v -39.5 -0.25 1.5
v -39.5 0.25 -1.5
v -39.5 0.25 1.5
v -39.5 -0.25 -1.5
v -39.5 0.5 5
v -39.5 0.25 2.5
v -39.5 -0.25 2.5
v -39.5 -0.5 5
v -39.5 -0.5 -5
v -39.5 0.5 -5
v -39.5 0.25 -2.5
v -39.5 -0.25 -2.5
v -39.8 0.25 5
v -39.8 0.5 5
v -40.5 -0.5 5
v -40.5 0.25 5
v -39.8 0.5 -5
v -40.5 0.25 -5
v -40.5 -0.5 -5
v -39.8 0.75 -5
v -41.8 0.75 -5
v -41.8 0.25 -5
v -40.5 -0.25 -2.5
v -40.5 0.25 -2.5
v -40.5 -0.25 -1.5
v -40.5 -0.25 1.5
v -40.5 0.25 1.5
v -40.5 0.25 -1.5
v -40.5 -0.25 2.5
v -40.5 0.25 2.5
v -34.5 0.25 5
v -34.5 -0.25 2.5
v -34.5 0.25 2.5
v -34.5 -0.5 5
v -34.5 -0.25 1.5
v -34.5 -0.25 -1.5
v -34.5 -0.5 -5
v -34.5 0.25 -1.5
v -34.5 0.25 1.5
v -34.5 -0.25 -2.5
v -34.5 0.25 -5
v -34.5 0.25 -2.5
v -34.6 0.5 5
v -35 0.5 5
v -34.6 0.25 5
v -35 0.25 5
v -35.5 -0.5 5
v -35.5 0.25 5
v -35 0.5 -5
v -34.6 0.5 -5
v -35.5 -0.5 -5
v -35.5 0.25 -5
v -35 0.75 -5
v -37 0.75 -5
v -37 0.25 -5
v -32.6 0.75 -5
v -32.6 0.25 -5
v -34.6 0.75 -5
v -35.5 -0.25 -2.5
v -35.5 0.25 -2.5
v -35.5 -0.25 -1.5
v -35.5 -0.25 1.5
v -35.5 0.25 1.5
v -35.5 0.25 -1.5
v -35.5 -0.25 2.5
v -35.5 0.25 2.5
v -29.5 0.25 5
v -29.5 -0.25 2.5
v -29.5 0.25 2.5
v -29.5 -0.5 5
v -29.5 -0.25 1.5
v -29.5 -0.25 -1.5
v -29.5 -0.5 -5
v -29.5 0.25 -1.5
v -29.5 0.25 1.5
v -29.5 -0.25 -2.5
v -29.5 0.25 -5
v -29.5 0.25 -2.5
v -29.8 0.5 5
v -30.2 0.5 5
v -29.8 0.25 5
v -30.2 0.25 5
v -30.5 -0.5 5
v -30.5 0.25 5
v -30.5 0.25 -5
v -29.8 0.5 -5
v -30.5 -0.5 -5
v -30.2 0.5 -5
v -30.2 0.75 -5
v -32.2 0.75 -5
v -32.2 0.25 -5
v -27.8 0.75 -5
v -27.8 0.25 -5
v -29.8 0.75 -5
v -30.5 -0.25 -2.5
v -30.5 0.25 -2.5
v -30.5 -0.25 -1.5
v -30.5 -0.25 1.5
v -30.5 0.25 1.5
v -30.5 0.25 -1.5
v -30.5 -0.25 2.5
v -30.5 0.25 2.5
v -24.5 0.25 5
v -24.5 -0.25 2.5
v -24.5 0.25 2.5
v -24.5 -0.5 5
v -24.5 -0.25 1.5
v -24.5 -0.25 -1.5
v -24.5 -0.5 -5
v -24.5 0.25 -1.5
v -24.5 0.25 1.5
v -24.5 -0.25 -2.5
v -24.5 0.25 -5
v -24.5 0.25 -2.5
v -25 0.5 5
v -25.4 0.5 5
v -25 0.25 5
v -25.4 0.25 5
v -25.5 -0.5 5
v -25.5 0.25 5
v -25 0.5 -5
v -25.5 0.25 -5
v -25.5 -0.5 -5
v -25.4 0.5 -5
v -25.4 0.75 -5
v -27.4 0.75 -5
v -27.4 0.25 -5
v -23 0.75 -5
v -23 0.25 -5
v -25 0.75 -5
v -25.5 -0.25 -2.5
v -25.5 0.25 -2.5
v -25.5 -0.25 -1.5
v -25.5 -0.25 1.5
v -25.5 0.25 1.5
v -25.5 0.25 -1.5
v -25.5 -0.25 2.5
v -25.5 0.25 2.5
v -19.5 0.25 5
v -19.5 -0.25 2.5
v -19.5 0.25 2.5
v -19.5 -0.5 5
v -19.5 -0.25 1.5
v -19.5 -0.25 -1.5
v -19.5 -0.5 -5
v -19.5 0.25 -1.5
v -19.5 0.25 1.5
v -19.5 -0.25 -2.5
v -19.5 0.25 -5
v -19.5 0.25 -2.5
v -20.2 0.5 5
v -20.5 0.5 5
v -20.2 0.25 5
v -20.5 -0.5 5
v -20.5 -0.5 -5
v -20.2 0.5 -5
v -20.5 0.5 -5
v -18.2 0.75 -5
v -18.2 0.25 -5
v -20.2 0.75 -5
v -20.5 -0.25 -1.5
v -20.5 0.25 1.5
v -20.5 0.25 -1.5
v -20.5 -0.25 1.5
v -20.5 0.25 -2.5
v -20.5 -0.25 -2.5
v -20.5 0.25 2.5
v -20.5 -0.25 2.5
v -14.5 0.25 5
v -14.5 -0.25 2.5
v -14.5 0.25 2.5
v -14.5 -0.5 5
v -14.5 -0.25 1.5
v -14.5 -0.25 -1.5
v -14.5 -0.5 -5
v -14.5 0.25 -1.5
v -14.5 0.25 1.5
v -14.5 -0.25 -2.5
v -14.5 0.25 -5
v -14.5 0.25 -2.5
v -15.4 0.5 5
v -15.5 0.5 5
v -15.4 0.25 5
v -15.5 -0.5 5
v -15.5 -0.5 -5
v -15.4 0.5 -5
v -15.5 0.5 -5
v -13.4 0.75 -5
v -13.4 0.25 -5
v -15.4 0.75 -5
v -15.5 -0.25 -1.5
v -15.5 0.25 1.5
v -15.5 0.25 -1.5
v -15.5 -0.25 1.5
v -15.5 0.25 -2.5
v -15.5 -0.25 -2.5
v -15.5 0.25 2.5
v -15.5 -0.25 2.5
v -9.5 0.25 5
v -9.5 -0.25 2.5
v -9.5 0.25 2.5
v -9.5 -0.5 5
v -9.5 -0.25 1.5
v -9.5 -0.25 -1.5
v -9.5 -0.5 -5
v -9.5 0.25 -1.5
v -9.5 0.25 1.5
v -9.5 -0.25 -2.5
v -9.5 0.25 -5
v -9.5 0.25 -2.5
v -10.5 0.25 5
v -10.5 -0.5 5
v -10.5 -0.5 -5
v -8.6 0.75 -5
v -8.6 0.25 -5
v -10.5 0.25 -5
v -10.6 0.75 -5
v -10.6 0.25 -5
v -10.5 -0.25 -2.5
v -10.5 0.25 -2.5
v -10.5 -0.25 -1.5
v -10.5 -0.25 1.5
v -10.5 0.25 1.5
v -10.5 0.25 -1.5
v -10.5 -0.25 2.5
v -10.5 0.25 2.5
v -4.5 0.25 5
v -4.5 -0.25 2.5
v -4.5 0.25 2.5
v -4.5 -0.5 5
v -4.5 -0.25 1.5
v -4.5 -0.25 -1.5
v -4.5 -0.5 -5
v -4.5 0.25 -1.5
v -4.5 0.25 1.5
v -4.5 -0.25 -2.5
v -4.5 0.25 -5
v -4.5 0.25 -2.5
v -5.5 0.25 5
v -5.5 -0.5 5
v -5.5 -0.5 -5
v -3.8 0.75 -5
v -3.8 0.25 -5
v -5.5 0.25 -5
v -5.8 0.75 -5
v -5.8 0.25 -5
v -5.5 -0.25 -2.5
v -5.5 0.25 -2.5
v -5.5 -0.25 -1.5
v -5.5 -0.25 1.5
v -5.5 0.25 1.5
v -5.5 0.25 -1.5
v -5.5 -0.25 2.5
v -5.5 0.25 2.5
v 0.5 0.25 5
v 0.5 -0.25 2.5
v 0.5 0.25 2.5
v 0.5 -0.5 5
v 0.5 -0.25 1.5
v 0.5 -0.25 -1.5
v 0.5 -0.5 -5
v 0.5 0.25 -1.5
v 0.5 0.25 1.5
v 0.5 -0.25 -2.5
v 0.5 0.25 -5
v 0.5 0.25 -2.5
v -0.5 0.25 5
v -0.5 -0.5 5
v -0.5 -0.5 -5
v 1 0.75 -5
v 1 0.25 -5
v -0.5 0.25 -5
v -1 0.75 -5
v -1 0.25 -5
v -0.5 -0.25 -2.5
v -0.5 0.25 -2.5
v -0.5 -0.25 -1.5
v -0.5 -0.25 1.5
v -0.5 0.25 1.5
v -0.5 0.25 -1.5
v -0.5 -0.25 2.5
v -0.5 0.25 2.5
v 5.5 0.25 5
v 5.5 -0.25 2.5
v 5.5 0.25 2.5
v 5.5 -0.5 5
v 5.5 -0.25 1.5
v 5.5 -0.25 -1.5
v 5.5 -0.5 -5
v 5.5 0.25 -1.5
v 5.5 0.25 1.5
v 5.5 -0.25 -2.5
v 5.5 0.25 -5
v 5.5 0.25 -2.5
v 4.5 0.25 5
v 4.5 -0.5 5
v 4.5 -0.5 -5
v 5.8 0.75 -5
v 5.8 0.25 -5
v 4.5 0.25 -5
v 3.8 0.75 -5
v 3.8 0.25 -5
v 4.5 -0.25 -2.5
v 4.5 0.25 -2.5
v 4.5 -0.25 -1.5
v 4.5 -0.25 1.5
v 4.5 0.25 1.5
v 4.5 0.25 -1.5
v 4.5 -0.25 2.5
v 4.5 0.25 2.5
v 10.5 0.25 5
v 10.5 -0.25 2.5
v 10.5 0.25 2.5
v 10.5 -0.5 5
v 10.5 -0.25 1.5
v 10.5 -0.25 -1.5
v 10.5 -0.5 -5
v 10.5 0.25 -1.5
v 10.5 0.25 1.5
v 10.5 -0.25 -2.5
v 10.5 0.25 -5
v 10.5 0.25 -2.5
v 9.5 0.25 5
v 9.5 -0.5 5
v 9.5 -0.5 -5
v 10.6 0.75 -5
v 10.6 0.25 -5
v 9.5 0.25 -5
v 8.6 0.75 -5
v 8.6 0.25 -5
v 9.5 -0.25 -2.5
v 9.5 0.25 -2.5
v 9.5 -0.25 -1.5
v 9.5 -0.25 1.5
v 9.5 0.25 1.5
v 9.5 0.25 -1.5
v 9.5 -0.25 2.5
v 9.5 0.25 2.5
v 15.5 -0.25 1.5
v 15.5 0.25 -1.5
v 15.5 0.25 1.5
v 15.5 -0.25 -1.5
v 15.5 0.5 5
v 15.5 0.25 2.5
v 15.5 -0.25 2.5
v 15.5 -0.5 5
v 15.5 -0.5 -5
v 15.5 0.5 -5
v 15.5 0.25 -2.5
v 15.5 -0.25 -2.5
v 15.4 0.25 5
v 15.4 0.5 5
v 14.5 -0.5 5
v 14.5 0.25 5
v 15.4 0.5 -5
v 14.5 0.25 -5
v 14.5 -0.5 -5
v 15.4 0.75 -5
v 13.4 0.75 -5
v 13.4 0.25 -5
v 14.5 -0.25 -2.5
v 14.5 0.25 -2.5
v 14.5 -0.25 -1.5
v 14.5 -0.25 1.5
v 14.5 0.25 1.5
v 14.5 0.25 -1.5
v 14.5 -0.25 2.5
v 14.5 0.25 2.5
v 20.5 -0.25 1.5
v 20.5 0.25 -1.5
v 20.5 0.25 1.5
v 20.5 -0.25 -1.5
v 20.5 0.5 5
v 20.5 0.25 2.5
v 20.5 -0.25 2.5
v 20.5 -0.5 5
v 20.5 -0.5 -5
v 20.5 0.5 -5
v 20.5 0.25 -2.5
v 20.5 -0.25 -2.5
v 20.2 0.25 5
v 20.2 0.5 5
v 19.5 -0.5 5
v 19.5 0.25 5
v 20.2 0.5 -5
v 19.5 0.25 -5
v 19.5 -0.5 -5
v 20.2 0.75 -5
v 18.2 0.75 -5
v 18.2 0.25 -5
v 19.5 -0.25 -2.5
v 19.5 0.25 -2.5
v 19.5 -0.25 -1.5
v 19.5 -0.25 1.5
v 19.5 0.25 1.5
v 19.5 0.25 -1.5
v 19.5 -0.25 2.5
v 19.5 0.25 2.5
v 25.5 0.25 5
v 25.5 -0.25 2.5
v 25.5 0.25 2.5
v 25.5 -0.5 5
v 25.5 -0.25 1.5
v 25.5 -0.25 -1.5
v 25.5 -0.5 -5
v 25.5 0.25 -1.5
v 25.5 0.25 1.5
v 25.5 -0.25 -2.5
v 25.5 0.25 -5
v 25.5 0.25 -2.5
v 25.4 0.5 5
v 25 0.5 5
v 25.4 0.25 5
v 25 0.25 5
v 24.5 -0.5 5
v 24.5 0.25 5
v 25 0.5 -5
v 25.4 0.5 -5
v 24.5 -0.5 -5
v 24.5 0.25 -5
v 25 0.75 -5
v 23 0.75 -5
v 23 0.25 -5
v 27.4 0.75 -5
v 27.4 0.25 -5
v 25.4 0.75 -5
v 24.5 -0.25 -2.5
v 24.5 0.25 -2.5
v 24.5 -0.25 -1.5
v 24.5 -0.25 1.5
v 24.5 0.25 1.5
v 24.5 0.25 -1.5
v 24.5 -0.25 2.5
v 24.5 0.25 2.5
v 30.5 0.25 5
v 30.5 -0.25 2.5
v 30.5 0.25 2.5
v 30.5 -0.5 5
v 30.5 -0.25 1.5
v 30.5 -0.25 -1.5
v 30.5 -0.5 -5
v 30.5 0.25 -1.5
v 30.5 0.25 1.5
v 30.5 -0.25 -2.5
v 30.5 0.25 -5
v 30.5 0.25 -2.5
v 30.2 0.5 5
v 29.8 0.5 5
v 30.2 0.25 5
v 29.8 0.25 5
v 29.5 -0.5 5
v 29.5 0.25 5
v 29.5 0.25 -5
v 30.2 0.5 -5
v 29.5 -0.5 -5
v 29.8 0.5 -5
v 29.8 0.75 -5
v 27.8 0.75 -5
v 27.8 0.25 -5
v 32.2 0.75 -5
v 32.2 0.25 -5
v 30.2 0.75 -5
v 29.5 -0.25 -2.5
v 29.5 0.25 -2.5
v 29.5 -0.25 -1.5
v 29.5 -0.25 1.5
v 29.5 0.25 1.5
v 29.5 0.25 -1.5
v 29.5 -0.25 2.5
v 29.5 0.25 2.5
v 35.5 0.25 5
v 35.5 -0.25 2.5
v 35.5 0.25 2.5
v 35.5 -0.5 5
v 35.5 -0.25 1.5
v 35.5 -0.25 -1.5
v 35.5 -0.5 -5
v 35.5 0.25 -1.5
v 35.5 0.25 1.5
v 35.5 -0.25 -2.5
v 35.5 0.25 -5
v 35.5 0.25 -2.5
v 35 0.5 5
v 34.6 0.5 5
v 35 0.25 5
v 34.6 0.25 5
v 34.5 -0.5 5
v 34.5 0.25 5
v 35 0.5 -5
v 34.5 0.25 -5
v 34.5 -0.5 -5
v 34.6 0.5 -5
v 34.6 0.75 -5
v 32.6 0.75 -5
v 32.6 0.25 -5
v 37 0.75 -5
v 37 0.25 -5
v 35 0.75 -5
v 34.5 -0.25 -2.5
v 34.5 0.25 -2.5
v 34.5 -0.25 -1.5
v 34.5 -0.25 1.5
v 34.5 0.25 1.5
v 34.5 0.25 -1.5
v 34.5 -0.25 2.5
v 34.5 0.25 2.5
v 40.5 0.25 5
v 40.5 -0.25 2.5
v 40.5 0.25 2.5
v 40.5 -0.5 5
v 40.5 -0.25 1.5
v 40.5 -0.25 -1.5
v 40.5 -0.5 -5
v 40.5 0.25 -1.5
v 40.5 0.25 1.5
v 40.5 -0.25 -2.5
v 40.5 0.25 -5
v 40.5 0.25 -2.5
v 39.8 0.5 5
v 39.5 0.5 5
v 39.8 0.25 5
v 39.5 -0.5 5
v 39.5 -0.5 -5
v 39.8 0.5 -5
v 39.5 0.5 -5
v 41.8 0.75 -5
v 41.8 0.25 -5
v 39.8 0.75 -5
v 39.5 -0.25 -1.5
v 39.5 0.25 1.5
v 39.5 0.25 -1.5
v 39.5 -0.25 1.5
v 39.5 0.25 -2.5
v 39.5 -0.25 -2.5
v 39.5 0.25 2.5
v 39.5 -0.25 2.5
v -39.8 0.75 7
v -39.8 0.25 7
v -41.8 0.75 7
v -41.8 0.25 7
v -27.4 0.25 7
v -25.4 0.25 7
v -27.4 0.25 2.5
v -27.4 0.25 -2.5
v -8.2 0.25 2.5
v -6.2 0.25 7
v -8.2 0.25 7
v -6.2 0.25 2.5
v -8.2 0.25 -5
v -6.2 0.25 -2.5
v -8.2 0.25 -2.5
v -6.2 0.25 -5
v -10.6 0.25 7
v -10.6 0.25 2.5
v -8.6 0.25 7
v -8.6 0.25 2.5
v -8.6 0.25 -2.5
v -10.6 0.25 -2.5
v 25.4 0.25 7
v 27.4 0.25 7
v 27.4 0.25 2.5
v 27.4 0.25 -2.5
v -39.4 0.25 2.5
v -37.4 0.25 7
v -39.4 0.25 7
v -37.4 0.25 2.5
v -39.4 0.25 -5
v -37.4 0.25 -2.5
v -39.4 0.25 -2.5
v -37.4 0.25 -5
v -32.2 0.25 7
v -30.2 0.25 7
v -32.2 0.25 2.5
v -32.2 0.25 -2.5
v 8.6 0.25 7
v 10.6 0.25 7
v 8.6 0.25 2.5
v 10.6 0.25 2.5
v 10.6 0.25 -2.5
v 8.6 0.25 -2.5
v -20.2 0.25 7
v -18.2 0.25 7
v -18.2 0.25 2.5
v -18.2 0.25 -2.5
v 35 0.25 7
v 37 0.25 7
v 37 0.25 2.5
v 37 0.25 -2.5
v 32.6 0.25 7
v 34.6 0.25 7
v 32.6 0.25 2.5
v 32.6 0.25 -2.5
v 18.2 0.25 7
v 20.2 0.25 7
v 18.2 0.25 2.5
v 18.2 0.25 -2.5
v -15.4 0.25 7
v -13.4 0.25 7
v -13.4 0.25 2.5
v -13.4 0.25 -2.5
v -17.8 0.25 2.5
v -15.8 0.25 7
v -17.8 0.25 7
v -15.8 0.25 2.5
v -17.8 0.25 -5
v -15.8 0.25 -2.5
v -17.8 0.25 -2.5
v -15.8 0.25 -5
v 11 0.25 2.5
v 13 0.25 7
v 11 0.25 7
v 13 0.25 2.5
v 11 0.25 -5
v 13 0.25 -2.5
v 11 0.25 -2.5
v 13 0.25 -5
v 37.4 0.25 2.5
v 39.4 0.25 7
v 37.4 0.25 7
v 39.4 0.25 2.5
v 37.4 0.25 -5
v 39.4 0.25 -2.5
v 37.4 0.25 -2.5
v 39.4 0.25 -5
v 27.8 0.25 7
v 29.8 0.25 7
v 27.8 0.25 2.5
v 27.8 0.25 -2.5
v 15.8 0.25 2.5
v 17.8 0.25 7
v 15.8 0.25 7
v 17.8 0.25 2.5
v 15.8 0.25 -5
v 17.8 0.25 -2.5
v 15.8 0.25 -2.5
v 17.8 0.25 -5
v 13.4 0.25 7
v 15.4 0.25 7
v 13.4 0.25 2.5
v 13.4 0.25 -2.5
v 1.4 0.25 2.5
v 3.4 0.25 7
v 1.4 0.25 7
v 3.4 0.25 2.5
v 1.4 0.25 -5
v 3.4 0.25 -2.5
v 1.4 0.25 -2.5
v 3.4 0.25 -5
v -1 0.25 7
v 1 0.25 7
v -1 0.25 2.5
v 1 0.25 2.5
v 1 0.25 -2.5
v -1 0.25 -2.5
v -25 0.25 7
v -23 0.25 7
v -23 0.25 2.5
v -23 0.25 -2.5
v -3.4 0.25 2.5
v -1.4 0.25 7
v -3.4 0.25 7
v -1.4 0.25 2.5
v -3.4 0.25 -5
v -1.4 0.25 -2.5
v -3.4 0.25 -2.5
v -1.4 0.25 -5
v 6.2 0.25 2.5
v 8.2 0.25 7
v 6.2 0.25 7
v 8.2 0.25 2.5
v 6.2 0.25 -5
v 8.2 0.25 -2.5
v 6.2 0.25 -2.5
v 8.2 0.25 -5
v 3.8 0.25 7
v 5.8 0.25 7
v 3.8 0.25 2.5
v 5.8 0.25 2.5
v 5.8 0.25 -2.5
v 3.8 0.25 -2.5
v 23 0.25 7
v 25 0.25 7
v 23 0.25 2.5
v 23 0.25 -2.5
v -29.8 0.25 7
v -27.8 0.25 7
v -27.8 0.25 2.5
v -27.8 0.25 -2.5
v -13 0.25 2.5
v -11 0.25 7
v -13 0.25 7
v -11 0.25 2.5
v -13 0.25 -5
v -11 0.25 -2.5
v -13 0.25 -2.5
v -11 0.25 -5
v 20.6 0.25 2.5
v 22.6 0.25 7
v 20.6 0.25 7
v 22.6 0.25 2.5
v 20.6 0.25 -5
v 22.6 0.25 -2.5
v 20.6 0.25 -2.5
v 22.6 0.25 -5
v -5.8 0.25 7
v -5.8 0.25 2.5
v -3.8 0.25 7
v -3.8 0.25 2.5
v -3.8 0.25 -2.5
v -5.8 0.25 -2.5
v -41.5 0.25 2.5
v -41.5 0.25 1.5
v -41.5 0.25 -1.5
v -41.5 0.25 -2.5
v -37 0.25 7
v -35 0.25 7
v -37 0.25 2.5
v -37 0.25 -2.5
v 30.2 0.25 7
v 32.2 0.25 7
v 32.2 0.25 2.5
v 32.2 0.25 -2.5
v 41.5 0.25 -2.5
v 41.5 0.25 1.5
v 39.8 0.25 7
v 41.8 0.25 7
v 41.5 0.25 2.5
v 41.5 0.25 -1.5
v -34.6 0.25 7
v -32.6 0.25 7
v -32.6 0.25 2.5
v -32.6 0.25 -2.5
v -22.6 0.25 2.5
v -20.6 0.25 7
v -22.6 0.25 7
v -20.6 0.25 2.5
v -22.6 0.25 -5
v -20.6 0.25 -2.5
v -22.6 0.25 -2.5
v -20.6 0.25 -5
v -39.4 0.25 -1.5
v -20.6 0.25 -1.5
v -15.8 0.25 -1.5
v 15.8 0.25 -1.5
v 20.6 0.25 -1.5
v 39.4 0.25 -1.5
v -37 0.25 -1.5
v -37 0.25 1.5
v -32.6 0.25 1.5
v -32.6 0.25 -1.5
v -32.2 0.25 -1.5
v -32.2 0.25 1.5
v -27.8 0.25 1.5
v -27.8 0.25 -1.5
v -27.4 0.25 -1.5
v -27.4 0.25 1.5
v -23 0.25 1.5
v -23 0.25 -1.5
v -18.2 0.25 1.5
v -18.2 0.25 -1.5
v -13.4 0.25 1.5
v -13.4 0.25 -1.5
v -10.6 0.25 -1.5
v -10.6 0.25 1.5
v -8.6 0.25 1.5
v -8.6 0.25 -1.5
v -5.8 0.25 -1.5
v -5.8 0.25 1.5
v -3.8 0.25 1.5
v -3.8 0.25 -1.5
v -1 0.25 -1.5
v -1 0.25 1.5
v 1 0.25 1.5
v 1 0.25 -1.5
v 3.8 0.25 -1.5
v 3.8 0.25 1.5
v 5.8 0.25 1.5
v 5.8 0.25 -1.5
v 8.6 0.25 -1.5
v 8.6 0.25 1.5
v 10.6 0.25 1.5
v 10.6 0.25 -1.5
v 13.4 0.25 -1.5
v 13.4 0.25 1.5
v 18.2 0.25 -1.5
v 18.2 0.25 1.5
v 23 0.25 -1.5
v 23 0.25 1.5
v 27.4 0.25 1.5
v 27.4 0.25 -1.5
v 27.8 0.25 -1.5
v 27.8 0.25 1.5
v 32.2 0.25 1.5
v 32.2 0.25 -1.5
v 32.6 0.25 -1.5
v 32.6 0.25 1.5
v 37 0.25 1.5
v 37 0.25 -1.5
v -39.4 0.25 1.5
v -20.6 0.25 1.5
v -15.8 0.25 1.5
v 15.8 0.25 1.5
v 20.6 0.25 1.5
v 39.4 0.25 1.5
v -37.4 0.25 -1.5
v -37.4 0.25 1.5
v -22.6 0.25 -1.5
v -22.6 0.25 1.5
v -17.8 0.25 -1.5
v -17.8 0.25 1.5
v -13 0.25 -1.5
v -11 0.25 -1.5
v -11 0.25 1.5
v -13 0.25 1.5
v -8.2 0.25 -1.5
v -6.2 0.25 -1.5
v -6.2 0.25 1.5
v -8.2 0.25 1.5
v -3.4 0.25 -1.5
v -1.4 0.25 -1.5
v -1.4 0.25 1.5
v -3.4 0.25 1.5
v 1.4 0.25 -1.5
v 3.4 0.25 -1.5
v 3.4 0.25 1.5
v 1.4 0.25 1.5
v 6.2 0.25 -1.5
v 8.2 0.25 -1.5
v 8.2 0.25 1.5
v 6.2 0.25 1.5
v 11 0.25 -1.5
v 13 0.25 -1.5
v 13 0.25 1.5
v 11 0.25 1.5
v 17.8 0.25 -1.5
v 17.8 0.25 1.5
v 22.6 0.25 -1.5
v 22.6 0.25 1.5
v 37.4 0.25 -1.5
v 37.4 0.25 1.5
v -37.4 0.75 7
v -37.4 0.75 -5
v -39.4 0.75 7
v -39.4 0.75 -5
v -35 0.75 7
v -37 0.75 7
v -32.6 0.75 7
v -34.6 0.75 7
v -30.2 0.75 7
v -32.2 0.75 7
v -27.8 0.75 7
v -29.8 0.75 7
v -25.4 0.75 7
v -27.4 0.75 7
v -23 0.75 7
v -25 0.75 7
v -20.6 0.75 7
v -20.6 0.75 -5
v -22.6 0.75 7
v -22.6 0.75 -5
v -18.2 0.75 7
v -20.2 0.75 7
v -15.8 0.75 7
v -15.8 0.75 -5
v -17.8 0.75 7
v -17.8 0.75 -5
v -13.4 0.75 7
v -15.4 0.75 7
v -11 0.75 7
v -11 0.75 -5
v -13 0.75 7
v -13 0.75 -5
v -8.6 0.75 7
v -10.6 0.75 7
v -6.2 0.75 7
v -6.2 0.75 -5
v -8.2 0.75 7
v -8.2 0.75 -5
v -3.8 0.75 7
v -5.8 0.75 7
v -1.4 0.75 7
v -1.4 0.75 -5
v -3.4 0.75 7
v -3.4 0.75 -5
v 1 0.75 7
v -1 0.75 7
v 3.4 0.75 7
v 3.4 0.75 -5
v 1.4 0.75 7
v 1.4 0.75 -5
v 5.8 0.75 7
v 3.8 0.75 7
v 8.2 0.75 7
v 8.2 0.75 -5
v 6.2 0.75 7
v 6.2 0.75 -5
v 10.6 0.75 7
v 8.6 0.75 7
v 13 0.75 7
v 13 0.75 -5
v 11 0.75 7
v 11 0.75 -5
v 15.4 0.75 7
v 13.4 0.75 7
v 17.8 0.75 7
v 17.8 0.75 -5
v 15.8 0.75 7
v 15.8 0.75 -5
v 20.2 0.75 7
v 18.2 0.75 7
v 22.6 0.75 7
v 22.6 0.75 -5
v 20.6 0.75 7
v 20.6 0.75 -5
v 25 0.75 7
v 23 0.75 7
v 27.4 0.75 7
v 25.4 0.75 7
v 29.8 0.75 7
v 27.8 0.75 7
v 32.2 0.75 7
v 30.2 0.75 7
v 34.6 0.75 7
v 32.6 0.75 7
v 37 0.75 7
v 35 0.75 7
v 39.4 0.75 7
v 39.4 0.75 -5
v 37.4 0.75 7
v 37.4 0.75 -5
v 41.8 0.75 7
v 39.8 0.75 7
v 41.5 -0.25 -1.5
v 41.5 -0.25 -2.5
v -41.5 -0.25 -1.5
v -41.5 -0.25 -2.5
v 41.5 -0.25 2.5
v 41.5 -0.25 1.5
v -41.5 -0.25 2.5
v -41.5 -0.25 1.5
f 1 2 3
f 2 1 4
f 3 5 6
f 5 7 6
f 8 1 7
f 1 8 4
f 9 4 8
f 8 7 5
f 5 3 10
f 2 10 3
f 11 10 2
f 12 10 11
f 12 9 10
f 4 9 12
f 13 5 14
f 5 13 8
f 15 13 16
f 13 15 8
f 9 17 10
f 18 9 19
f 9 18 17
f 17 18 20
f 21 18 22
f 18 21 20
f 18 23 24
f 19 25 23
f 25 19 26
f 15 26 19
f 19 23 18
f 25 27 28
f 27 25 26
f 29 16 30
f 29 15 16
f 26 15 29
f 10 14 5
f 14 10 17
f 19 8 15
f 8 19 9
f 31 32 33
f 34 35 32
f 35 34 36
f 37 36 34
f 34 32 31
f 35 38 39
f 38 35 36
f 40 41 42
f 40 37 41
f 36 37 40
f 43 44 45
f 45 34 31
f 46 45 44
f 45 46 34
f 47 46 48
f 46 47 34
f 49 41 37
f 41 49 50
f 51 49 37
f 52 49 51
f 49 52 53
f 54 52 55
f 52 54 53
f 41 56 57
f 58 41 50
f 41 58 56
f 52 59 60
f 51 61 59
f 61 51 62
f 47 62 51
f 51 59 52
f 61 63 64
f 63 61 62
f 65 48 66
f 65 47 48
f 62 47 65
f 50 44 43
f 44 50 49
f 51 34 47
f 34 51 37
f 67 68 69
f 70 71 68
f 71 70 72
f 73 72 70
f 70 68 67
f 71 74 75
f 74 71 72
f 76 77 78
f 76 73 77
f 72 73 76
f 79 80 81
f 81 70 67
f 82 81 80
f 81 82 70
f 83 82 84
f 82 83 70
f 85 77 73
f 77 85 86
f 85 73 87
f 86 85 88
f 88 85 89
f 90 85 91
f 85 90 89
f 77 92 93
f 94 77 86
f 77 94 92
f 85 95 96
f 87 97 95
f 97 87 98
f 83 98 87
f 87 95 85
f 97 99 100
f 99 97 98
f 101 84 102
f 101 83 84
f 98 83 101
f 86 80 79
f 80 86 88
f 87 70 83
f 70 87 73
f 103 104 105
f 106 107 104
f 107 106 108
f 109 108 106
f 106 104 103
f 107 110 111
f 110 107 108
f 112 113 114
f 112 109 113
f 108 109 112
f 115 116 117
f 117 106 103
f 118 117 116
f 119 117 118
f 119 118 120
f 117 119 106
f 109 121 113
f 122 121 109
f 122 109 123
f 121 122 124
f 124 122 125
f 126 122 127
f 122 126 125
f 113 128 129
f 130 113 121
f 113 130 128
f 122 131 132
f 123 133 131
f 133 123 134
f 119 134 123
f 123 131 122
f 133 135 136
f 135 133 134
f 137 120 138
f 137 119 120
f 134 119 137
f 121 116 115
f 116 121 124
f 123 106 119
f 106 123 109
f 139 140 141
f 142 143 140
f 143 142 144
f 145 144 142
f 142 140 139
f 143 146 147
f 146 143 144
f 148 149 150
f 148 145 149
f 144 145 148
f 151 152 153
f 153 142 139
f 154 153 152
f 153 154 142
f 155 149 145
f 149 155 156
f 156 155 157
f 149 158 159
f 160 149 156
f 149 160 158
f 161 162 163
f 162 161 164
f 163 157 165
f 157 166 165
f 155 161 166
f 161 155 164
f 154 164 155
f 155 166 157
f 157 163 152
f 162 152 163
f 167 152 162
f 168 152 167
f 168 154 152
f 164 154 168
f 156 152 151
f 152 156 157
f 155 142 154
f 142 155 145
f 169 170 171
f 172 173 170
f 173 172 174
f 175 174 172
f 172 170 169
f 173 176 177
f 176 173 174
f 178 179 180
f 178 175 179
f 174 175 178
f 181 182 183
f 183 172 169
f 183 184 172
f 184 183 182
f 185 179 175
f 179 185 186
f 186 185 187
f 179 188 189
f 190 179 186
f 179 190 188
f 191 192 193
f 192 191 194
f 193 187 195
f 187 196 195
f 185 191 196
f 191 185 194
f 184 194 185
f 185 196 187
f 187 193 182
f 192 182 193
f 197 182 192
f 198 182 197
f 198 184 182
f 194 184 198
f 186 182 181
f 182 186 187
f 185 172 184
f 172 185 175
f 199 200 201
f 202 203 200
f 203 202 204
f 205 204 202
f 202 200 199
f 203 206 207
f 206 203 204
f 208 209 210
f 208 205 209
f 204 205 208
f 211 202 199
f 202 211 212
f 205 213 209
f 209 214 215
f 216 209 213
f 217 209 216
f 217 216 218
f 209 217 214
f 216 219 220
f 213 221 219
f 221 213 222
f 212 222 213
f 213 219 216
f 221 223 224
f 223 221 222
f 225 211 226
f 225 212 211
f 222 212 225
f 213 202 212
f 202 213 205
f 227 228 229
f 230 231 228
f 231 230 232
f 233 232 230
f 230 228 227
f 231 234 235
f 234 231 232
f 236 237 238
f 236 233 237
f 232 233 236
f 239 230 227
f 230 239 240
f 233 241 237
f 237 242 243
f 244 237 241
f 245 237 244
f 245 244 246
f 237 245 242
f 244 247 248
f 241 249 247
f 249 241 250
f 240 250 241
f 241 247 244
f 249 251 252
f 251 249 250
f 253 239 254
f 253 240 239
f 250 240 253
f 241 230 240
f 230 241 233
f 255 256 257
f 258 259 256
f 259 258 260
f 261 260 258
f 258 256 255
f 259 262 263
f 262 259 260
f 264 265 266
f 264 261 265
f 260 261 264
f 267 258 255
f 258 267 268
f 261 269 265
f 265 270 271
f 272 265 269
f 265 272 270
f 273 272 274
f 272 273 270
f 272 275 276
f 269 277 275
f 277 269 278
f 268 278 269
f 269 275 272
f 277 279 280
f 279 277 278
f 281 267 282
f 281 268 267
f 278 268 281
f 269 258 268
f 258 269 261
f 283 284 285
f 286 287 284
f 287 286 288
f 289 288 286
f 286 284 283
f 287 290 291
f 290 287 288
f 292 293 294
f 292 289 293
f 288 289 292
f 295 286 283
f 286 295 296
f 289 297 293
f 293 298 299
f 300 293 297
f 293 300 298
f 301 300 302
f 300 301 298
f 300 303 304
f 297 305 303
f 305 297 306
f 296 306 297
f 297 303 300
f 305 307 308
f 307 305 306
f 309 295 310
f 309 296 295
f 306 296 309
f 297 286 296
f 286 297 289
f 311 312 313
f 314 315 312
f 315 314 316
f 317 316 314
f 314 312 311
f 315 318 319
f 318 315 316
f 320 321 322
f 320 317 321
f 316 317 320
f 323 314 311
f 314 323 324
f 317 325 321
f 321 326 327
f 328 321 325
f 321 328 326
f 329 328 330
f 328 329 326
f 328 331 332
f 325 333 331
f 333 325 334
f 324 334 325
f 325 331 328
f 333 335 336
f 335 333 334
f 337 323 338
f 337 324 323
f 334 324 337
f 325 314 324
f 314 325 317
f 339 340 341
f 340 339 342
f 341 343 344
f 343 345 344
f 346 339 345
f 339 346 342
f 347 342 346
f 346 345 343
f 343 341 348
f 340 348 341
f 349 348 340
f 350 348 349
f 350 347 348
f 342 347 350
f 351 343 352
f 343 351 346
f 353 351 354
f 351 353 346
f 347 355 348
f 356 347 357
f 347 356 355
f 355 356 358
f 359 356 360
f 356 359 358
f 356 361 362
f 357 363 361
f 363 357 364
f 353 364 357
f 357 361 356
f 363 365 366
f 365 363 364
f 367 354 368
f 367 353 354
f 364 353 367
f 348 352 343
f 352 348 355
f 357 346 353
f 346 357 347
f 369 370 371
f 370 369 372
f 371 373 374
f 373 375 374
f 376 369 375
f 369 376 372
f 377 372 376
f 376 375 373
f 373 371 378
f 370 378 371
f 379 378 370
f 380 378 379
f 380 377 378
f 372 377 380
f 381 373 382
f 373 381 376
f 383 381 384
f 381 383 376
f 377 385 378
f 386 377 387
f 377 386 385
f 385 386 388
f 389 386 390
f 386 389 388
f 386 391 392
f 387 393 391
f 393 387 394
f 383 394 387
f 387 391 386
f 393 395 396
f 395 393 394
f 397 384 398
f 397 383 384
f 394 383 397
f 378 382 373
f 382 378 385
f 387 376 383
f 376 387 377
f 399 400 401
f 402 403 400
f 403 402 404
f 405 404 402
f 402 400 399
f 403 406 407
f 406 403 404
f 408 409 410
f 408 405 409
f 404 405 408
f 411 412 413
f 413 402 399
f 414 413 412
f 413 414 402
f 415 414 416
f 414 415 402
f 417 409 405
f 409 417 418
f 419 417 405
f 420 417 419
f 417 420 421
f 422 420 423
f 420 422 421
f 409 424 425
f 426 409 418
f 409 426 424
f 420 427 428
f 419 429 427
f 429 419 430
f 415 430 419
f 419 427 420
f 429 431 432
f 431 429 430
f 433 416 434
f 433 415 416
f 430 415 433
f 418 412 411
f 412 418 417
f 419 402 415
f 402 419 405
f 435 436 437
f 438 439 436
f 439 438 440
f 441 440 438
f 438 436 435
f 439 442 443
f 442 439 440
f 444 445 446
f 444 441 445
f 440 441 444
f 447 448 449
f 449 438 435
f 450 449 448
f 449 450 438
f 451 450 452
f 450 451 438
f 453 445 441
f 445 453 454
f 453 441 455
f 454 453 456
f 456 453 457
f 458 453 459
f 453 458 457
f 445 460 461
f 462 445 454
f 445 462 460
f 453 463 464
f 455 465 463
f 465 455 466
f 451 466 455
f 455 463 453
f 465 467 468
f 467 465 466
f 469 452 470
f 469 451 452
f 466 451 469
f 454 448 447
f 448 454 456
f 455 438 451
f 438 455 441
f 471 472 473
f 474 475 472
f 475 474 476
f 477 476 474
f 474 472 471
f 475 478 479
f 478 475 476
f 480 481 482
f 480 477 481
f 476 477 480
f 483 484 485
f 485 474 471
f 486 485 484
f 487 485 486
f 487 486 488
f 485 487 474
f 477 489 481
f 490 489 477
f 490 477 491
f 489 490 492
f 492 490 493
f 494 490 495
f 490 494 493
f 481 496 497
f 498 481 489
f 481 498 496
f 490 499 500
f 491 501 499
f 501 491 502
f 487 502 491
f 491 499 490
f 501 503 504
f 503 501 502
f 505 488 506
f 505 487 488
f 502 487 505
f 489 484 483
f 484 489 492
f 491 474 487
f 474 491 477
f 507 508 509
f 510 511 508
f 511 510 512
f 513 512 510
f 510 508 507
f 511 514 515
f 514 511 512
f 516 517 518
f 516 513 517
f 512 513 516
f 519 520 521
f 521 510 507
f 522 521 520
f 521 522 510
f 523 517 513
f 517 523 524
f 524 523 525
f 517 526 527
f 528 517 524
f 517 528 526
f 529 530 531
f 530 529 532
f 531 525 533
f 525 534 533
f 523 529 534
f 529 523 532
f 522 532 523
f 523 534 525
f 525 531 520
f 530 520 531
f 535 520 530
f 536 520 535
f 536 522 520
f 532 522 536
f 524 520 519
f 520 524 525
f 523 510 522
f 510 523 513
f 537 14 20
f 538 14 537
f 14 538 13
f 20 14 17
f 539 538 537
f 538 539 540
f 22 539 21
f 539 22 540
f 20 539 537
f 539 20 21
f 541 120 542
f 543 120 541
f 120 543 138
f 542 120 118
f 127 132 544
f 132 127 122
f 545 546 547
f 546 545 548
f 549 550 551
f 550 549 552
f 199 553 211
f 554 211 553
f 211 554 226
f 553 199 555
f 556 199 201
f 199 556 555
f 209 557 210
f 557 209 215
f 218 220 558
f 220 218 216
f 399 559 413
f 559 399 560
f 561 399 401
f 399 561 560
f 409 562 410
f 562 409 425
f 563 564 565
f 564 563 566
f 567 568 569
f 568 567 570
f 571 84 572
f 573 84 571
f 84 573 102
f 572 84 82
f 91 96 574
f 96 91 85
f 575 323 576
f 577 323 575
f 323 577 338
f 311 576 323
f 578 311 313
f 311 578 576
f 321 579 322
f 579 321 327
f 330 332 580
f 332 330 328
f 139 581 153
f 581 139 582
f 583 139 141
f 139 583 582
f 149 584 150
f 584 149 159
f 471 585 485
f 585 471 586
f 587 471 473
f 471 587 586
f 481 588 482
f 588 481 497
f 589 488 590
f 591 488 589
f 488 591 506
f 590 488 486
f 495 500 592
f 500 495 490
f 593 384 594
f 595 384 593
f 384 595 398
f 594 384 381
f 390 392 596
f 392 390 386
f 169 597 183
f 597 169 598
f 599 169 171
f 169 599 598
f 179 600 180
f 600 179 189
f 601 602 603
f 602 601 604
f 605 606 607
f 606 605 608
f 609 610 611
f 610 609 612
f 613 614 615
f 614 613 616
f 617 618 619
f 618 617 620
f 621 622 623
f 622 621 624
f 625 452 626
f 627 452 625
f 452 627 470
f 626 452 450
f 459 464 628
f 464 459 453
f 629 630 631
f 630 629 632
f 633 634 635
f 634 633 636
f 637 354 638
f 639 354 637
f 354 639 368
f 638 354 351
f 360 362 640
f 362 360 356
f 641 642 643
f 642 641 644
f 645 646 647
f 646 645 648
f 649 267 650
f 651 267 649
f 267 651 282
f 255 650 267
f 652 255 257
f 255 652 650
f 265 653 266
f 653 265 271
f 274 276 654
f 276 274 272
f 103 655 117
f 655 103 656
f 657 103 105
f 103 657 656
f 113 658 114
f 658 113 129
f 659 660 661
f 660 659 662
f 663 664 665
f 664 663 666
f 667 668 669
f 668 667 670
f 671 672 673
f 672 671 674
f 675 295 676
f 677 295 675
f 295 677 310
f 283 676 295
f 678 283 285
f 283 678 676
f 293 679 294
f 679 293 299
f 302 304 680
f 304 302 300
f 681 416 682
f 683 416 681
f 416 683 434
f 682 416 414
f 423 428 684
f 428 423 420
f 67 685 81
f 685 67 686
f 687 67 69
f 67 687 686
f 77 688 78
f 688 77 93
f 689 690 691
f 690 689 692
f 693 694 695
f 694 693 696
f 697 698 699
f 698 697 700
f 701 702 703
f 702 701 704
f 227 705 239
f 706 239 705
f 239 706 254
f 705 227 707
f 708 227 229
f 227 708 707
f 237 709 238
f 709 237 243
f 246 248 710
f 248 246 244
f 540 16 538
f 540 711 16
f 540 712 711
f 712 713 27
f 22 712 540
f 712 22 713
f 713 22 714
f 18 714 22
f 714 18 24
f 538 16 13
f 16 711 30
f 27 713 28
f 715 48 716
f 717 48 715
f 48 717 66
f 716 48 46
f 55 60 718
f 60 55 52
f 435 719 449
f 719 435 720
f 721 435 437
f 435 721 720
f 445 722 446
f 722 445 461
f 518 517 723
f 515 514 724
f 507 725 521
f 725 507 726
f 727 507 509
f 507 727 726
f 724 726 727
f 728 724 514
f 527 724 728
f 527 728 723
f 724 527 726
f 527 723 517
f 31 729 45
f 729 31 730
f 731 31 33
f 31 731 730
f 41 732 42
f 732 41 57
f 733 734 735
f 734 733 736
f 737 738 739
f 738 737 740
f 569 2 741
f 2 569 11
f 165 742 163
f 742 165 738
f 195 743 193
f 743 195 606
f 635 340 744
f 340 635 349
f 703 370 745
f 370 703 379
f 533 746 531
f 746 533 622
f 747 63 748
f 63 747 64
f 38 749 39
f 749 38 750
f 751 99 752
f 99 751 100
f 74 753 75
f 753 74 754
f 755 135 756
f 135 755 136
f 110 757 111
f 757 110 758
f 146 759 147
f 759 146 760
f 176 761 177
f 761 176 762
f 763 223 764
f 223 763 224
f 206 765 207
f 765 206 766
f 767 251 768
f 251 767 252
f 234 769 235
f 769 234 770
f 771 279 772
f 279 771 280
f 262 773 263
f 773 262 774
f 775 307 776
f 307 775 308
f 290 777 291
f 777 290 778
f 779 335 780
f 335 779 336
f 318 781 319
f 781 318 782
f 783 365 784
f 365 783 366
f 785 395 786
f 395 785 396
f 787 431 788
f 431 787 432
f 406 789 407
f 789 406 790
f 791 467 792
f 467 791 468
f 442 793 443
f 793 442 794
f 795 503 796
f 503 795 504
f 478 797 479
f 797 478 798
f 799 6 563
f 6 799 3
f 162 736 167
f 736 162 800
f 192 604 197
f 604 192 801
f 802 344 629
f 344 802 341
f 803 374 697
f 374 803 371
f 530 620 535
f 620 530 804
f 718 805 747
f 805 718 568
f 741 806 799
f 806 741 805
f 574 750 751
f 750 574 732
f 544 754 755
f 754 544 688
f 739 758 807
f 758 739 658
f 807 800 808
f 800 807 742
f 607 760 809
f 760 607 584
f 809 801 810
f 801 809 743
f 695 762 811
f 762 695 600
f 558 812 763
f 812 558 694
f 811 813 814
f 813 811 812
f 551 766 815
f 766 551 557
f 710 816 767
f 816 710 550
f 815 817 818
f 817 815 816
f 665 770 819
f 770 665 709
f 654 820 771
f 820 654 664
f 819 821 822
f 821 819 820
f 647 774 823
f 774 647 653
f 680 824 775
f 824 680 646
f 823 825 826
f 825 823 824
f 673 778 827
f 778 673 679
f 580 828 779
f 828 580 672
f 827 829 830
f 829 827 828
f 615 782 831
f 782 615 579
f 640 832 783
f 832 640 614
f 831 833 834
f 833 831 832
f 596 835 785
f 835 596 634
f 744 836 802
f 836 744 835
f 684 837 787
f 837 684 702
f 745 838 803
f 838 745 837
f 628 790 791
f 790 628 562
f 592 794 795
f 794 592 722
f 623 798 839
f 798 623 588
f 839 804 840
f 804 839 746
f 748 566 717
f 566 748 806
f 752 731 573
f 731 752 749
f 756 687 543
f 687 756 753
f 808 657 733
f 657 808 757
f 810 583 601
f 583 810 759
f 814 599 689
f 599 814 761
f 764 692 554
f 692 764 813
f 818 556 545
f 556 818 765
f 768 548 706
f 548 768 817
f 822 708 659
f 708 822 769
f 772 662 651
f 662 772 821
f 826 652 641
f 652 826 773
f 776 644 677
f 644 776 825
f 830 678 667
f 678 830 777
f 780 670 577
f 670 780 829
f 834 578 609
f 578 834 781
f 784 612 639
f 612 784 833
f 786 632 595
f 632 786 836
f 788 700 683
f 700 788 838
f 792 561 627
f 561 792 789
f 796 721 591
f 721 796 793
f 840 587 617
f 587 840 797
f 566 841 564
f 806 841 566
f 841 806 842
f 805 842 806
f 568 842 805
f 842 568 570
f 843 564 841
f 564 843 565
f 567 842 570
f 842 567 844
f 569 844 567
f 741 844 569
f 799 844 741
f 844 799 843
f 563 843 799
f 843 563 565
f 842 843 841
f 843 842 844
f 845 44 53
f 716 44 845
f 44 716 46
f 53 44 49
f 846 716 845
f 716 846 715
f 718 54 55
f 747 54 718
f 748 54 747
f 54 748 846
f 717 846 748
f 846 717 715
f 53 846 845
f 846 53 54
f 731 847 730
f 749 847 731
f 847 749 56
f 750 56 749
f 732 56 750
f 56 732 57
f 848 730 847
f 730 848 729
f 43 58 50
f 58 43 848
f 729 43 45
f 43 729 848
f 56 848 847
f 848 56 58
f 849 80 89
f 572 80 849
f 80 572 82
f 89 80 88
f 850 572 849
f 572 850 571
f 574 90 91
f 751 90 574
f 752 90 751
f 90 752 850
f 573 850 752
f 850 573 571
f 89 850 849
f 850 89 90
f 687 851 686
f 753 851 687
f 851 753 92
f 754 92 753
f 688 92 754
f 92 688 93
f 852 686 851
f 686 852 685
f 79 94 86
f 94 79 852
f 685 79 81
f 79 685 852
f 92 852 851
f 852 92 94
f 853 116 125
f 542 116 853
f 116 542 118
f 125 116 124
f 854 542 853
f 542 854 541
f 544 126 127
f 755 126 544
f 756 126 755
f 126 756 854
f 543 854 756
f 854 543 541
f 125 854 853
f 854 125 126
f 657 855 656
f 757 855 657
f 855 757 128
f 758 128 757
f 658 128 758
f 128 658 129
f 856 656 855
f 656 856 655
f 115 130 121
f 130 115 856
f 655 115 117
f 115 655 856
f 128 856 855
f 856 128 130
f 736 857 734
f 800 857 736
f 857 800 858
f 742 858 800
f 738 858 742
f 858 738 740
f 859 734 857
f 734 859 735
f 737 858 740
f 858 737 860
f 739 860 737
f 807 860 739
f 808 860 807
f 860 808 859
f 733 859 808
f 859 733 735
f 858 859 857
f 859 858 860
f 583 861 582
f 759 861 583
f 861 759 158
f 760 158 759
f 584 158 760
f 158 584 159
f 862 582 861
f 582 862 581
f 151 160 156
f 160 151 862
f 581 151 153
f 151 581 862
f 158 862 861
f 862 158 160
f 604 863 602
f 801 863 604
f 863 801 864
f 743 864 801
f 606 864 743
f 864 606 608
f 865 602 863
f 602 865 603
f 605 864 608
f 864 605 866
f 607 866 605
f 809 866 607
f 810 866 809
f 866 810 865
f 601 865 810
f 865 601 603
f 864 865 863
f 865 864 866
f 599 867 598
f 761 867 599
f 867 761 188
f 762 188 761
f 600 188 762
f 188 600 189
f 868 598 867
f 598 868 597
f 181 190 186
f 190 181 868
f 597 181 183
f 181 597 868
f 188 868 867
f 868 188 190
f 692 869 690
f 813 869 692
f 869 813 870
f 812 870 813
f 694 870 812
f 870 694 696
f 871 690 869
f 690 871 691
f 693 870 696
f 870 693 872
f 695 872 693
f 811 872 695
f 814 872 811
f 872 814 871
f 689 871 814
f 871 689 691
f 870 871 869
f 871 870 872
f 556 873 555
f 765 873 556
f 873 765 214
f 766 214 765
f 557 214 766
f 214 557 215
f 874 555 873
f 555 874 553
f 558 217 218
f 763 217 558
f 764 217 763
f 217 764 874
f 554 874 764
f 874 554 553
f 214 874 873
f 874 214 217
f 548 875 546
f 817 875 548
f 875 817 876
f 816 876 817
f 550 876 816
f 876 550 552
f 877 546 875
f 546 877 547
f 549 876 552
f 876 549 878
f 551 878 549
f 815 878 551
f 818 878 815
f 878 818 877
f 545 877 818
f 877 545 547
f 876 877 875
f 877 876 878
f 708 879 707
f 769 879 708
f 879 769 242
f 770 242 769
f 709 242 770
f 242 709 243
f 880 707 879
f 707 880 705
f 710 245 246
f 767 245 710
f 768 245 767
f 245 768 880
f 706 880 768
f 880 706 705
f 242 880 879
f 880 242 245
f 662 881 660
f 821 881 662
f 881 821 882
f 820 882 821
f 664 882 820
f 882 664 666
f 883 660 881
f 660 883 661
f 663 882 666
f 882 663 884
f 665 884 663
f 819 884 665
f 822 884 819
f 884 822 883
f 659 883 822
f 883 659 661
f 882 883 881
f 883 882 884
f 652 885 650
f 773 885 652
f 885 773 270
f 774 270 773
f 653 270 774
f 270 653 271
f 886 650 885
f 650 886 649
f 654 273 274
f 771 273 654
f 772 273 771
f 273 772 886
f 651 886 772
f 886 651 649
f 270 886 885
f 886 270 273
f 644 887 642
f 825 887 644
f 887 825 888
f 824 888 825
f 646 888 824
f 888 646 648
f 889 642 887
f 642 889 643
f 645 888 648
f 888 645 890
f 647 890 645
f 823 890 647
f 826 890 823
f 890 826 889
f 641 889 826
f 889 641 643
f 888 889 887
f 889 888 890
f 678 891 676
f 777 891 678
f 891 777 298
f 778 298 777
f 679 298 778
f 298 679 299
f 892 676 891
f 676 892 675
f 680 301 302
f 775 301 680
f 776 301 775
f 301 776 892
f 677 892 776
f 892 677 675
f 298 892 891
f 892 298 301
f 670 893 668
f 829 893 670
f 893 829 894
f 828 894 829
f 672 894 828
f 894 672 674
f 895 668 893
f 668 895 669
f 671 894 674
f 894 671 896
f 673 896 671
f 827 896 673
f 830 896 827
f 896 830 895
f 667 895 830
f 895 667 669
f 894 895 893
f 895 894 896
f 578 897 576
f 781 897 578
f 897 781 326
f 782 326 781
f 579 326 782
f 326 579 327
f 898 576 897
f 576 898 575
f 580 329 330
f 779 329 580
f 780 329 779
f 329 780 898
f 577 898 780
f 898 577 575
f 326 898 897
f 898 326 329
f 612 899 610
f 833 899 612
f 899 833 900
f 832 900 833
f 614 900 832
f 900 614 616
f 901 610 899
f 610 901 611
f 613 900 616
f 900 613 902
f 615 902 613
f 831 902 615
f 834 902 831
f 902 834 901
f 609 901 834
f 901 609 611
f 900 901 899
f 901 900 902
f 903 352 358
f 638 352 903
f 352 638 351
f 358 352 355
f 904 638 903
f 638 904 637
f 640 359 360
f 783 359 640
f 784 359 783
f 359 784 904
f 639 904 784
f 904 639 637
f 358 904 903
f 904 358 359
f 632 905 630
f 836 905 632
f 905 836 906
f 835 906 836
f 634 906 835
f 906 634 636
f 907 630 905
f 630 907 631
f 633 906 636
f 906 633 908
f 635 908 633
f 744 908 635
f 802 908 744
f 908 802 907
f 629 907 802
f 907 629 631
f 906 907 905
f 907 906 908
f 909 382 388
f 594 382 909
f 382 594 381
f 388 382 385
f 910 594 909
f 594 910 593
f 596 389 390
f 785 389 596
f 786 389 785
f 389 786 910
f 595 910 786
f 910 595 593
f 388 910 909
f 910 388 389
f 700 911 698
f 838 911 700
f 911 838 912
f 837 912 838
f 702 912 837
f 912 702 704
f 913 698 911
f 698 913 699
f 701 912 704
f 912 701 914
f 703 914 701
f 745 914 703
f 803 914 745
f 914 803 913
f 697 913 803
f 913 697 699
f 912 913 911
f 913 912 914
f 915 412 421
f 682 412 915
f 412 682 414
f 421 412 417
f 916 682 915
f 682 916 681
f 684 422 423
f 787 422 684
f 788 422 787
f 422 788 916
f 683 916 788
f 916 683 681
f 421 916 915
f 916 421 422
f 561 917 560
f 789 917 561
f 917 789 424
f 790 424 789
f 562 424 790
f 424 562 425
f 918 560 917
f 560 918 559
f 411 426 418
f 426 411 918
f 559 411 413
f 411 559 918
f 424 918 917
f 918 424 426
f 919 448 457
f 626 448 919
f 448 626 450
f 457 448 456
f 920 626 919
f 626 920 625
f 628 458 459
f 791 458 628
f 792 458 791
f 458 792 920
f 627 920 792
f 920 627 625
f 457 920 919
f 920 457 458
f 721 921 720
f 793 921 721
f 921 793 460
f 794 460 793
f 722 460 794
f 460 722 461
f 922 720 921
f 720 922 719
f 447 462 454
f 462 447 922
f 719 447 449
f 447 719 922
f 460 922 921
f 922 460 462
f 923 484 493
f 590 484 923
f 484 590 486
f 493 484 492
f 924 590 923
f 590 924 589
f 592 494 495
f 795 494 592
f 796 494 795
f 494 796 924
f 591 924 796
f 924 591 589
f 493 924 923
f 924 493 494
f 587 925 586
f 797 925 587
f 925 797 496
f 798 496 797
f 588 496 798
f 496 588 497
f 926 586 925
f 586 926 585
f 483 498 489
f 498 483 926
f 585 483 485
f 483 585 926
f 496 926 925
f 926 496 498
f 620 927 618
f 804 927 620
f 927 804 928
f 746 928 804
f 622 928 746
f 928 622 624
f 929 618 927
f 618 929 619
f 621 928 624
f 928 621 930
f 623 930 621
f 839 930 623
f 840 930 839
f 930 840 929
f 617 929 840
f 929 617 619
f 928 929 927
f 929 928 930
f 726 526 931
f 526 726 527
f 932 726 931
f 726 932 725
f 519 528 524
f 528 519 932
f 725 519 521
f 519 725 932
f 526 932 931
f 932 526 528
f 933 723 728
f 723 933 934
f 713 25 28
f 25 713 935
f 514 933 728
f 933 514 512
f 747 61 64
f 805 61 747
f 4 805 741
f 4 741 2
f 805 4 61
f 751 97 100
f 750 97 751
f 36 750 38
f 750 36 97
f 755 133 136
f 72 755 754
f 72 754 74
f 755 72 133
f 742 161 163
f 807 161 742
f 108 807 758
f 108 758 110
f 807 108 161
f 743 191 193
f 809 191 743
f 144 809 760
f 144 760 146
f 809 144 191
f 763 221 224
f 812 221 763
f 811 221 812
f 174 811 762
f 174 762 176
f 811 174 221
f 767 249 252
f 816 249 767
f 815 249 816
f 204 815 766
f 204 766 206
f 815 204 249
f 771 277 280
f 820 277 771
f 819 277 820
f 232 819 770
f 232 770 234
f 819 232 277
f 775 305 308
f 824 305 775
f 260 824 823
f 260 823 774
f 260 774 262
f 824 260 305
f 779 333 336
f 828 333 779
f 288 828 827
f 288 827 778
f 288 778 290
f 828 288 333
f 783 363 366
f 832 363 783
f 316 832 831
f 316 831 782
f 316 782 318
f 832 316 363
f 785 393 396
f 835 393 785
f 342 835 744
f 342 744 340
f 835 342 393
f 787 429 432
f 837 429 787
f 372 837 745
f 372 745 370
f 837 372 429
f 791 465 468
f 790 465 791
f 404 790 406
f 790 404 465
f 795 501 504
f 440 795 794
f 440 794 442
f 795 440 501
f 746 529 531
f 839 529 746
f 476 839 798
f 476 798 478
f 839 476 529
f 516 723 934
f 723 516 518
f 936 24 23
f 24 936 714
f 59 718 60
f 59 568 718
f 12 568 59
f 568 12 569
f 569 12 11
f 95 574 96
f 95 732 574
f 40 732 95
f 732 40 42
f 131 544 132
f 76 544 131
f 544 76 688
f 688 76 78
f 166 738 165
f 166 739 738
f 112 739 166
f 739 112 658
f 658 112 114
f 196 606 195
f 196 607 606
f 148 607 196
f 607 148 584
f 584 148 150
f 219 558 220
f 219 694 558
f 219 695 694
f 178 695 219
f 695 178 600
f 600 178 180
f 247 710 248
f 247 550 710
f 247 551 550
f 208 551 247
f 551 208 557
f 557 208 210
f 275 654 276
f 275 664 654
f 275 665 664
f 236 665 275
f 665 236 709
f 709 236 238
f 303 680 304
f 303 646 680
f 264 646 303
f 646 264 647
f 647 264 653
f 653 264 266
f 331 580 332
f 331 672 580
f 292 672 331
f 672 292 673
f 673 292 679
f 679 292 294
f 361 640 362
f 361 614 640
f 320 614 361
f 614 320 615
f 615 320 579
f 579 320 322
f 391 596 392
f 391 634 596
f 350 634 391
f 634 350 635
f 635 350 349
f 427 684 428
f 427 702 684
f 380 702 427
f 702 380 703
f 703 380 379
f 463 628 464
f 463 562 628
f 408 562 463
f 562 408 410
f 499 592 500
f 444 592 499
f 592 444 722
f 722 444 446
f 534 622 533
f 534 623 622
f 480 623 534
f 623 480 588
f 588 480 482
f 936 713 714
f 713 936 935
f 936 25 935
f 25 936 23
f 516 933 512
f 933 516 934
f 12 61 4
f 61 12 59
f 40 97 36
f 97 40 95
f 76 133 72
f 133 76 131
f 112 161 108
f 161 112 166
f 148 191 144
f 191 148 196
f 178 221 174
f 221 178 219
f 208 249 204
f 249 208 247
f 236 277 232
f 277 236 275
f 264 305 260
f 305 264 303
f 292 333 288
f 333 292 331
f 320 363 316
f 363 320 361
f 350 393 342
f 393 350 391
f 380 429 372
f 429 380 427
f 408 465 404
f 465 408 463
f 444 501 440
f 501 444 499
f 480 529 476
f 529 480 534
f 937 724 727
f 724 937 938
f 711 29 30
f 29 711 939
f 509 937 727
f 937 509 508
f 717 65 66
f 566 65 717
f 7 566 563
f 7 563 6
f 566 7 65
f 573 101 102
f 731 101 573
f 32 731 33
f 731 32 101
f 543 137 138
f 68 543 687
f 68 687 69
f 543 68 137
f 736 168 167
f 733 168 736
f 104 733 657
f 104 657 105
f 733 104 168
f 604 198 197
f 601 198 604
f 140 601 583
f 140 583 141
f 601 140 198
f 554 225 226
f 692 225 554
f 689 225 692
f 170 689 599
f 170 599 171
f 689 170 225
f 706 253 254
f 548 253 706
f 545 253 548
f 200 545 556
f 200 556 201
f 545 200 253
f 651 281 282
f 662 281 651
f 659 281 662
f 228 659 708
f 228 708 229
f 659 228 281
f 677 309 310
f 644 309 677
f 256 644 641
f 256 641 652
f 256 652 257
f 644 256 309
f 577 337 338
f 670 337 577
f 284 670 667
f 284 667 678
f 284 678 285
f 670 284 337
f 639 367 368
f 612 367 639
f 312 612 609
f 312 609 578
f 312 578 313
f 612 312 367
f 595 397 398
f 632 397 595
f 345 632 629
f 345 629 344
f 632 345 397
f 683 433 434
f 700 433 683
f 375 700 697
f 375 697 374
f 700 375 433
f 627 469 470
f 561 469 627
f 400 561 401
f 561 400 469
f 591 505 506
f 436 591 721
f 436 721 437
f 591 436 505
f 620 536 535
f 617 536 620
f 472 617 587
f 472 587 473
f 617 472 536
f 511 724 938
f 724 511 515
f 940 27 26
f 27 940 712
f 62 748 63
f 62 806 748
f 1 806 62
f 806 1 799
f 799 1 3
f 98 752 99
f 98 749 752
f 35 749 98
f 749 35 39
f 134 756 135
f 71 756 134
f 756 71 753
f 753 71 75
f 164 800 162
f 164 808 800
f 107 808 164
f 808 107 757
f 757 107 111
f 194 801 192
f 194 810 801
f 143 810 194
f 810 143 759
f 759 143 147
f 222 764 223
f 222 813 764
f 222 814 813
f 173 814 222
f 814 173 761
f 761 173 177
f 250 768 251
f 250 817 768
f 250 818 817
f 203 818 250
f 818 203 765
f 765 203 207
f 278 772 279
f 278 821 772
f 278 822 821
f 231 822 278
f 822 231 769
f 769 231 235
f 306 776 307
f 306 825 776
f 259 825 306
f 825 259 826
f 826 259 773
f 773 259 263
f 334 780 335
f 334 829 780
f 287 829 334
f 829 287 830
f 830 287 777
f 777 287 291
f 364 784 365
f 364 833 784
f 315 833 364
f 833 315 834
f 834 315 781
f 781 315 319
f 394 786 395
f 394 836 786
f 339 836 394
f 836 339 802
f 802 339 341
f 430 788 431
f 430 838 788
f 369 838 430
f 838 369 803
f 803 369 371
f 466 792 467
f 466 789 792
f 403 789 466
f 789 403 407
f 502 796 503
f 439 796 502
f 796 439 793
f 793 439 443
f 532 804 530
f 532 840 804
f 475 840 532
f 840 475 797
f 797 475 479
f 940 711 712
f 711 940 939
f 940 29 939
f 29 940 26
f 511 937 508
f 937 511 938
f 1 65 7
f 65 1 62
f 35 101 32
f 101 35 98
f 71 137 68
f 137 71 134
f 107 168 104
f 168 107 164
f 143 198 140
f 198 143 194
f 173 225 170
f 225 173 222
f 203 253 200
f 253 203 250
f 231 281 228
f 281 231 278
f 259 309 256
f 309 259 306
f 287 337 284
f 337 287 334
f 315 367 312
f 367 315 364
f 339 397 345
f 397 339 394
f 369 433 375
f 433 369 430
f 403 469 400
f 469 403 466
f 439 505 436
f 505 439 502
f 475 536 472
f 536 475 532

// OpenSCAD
module staccionata(){
color("#da6d42")
cube([1,1,10],center = true);
  

}

for (i=[-8:8])
   translate([i*5,0,0])
      staccionata();
      
color("#da6d42"){     
translate([0,0,-2])      
cube([83,0.5,1],center = true);}

color("#da6d42"){  
translate([0,0,2])
cube([83,0.5,1],center = true);
}

color("#bd9476"){
for (i=[-17:17])

   translate([i*2.4,0.5,1])
      cube([2,0.5,12],center = true);
      }
